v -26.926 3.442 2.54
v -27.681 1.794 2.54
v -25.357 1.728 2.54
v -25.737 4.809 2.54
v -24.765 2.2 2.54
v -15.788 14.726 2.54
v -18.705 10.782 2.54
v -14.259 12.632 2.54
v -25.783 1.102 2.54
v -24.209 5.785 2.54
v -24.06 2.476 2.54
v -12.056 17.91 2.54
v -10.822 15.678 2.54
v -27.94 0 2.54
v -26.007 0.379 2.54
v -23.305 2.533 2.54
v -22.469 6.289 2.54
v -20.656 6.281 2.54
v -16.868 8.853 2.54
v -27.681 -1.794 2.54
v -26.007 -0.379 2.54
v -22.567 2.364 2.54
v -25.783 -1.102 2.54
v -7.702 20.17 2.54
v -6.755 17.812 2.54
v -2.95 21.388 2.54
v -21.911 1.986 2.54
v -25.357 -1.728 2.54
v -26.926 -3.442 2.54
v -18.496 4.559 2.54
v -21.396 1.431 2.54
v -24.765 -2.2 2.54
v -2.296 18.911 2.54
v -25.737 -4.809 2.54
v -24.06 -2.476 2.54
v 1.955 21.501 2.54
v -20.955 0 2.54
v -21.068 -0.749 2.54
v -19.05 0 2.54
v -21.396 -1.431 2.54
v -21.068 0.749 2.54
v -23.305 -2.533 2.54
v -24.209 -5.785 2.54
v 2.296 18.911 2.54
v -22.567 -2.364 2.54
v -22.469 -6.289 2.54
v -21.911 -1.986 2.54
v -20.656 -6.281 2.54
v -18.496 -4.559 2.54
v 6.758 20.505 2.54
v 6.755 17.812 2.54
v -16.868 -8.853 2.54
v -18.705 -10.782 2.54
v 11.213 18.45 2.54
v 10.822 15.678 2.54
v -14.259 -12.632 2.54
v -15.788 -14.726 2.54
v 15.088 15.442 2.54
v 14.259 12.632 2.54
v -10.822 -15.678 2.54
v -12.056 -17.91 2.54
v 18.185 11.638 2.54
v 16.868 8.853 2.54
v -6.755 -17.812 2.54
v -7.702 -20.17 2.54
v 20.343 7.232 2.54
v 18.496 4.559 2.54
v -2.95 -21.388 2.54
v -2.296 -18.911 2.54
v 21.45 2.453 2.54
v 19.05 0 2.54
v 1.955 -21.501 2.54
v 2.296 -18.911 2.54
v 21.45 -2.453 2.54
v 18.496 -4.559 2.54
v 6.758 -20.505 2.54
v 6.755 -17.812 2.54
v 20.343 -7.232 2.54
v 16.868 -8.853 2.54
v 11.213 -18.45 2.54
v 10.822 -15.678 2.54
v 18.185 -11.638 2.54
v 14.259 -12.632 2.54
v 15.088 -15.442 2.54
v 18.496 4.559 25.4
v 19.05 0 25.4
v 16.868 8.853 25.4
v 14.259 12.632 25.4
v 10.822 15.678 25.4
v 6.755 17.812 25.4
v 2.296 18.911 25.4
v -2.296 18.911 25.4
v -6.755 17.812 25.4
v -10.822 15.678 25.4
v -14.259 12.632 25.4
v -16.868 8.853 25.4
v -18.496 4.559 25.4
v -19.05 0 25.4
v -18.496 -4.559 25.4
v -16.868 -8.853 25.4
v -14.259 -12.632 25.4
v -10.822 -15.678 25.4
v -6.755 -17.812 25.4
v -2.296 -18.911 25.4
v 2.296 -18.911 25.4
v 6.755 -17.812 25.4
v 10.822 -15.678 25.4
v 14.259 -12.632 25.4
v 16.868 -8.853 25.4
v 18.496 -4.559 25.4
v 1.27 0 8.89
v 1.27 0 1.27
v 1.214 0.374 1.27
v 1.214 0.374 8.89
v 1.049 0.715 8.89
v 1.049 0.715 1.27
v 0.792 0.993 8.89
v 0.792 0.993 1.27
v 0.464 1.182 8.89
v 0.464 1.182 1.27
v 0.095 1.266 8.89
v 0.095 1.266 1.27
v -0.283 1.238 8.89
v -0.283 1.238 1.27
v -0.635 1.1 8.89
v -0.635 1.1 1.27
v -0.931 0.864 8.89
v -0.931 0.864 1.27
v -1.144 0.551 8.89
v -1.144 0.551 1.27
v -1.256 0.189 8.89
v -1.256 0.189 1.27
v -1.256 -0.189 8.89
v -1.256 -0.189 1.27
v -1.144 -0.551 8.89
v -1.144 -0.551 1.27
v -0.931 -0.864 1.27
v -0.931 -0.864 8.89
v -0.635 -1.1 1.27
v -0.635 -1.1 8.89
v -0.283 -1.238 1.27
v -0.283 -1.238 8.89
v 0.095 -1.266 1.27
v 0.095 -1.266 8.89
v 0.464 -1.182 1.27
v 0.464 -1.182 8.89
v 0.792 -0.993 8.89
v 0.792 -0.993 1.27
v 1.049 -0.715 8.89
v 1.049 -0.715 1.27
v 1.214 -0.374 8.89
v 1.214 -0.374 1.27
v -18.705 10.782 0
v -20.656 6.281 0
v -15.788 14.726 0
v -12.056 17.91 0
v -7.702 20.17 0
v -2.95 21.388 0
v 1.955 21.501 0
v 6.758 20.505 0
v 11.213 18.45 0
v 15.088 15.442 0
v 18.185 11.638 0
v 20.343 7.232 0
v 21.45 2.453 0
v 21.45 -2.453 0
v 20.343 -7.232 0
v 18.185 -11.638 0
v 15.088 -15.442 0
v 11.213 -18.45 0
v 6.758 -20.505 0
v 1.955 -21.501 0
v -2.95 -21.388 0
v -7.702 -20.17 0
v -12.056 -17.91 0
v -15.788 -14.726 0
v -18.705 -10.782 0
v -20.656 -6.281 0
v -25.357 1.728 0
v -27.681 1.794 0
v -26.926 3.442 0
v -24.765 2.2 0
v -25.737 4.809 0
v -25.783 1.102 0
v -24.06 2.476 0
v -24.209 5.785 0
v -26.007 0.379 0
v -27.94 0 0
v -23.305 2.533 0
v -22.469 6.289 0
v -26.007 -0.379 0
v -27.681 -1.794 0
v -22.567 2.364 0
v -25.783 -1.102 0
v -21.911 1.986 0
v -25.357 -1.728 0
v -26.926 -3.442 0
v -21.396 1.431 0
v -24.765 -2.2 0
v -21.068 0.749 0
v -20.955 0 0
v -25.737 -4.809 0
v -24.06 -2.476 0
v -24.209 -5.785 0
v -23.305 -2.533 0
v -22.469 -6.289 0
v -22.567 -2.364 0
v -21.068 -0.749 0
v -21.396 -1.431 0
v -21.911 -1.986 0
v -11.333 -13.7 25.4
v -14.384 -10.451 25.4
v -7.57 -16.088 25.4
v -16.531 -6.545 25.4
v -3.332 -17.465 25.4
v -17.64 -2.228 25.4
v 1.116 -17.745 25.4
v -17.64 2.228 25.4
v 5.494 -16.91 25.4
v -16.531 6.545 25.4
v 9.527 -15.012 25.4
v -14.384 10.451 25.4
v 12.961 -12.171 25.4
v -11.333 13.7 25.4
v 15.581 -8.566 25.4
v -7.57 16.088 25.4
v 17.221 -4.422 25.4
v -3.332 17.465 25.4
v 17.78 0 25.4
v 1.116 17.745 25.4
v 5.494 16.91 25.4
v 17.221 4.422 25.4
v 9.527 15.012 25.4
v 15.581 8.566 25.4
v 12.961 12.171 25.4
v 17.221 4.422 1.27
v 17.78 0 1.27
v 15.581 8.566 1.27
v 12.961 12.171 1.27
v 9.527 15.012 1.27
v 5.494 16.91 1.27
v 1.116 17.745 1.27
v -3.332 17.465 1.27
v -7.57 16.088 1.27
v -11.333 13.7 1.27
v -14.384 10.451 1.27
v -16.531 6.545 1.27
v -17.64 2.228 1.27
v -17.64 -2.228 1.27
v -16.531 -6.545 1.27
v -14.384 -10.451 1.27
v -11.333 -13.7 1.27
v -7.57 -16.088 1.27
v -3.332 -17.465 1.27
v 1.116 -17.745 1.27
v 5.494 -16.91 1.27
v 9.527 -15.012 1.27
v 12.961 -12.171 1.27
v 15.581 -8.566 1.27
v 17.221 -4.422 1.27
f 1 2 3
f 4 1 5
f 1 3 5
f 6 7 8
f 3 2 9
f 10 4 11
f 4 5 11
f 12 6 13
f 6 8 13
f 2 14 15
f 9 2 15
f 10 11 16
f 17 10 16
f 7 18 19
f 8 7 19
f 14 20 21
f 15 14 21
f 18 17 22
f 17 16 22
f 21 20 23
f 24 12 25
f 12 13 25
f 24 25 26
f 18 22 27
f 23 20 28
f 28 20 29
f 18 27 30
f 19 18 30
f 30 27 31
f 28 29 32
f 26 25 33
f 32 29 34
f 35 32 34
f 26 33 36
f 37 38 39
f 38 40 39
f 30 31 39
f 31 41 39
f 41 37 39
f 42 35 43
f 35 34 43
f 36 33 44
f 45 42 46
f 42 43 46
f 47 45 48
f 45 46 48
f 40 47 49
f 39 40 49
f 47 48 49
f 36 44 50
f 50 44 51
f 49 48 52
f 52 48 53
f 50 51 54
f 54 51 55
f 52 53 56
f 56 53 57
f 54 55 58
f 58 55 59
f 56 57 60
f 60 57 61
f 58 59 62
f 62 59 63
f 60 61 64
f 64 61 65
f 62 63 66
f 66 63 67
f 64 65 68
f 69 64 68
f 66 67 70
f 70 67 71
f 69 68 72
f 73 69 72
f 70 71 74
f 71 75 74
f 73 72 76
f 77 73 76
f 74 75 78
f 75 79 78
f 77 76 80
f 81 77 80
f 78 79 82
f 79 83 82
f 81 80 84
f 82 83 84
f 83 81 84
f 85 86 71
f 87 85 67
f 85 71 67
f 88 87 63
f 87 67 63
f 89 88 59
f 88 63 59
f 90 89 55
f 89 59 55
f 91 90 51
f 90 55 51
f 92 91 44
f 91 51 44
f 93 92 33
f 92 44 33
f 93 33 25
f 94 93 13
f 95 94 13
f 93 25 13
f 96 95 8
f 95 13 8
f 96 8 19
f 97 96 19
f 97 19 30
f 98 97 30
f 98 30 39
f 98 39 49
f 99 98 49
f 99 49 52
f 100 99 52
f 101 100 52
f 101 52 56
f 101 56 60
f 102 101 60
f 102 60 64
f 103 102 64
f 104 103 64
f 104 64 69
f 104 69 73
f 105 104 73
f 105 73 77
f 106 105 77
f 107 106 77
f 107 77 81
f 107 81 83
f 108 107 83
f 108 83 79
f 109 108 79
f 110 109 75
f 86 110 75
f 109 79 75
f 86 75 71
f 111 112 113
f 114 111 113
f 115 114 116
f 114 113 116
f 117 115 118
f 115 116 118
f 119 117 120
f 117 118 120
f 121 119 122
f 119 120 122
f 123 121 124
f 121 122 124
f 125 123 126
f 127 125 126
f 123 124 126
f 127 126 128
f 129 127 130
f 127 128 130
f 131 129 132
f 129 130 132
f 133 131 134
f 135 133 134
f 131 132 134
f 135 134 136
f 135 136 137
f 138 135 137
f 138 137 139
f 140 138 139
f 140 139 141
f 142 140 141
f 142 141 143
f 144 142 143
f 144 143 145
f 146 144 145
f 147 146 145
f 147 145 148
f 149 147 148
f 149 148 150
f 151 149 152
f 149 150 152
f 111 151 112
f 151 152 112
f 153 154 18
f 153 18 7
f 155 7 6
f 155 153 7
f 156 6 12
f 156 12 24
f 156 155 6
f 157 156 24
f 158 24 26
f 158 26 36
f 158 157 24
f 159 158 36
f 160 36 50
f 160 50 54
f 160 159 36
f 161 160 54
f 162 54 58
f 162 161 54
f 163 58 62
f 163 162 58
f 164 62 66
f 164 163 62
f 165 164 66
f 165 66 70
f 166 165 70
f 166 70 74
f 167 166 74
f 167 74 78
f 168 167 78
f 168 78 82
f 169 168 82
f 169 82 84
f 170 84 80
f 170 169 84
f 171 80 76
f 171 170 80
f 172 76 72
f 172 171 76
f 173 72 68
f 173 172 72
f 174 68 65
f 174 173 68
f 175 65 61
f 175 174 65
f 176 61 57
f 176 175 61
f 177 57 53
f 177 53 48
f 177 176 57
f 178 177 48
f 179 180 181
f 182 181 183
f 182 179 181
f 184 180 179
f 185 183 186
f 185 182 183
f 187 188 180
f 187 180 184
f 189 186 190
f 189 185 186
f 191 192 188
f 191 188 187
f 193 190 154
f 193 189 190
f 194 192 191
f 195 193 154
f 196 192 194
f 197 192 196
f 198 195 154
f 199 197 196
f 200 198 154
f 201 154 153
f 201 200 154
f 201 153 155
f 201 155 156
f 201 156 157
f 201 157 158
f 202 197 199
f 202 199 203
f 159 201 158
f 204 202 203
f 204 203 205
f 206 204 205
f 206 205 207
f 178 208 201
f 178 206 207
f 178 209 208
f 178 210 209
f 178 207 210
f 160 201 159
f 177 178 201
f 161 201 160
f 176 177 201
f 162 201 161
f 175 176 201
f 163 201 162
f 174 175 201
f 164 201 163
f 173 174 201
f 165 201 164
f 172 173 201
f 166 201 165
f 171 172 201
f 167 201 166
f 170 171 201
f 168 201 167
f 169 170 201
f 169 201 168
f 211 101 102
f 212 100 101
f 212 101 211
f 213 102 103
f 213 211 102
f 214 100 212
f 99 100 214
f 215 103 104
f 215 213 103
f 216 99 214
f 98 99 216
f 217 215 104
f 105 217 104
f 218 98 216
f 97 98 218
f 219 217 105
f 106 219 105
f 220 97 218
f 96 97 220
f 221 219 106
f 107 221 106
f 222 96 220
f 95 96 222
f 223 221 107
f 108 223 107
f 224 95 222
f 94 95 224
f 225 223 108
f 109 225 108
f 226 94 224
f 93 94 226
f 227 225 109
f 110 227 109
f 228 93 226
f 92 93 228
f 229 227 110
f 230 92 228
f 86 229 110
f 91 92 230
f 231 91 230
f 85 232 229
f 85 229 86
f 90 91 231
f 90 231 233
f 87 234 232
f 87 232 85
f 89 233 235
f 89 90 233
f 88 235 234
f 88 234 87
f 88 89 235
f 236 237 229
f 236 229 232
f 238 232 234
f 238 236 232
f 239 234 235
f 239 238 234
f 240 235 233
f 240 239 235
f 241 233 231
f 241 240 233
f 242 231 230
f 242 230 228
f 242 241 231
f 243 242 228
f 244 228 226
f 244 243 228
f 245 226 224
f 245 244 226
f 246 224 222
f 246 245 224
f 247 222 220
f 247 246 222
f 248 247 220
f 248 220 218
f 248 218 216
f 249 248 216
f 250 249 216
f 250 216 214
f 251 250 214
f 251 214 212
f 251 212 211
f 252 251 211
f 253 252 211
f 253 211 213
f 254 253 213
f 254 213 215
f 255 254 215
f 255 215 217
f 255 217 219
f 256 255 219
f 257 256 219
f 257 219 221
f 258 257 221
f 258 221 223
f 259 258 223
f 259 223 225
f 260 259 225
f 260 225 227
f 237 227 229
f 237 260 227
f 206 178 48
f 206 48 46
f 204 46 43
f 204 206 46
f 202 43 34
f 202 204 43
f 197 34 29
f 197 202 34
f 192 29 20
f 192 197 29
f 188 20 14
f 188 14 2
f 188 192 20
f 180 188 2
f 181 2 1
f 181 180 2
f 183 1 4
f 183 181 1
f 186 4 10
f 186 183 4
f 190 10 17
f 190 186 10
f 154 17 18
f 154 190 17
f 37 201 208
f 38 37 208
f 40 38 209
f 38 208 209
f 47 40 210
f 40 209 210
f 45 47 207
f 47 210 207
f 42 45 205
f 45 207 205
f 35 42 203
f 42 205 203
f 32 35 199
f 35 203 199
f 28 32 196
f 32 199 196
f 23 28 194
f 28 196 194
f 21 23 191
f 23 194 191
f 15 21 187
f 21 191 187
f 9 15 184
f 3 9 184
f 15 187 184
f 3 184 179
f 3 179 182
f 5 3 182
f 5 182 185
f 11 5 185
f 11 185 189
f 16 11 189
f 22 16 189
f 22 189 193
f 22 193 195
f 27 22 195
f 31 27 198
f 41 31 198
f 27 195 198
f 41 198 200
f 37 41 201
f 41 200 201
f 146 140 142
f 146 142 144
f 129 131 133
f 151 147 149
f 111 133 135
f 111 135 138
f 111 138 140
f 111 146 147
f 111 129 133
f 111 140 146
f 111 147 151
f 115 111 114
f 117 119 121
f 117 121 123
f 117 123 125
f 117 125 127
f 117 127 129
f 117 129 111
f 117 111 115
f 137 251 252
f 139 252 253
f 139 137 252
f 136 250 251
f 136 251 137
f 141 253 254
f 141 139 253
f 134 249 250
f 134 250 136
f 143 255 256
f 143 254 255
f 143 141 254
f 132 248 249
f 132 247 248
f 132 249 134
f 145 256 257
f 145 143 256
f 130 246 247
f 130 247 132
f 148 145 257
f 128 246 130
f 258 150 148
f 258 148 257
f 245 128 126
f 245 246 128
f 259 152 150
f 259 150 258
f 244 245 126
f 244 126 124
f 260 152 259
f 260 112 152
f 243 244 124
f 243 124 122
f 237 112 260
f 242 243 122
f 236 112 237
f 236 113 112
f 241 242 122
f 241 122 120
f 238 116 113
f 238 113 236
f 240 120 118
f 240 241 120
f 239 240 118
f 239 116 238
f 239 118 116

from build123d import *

# Parameters (mm, degrees)
F0_R     = 19.05
F1_DEPTH = 25.4
F2_T     = -1.27
F3_R     = 2.54
F3_R_2   = 19.05
F4_DEPTH = 2.54
F5_R     = 1.27
F6_DEPTH = 7.62


with BuildPart() as f1:
    # F0 (on Top) → F1 (new body)
    with BuildSketch(Plane.XY):
        Circle(F0_R)
    extrude(amount=F1_DEPTH)

    # F2
    f2_openings = [f1.faces().sort_by_distance(p)[0] for p in [
        (0, 0, 25.4),
    ]]
    offset(amount=F2_T, openings=f2_openings)

    # F3 (on face) → F4 (join)
    with BuildSketch(Plane(origin=(0, 0, 0), x_dir=(1, 0, 0), z_dir=(0, 0, -1))):
        with BuildLine():
            ThreePointArc((-20.6561764706, 6.2809612016), (-27.94, 0), (-20.6561764706, -6.2809612016))
            ThreePointArc((-20.6561764706, -6.2809612016), (21.59, 0), (-20.6561764706, 6.2809612016))
        make_face()
        with Locations((-23.495, 0)):
            Circle(F3_R, mode=Mode.SUBTRACT)
        Circle(F3_R_2, mode=Mode.SUBTRACT)
    extrude(amount=-F4_DEPTH)

    # F5 (on face) → F6 (join)
    with BuildSketch(Plane.XY.offset(1.27)):
        Circle(F5_R)
    extrude(amount=F6_DEPTH)


solid = f1.part
